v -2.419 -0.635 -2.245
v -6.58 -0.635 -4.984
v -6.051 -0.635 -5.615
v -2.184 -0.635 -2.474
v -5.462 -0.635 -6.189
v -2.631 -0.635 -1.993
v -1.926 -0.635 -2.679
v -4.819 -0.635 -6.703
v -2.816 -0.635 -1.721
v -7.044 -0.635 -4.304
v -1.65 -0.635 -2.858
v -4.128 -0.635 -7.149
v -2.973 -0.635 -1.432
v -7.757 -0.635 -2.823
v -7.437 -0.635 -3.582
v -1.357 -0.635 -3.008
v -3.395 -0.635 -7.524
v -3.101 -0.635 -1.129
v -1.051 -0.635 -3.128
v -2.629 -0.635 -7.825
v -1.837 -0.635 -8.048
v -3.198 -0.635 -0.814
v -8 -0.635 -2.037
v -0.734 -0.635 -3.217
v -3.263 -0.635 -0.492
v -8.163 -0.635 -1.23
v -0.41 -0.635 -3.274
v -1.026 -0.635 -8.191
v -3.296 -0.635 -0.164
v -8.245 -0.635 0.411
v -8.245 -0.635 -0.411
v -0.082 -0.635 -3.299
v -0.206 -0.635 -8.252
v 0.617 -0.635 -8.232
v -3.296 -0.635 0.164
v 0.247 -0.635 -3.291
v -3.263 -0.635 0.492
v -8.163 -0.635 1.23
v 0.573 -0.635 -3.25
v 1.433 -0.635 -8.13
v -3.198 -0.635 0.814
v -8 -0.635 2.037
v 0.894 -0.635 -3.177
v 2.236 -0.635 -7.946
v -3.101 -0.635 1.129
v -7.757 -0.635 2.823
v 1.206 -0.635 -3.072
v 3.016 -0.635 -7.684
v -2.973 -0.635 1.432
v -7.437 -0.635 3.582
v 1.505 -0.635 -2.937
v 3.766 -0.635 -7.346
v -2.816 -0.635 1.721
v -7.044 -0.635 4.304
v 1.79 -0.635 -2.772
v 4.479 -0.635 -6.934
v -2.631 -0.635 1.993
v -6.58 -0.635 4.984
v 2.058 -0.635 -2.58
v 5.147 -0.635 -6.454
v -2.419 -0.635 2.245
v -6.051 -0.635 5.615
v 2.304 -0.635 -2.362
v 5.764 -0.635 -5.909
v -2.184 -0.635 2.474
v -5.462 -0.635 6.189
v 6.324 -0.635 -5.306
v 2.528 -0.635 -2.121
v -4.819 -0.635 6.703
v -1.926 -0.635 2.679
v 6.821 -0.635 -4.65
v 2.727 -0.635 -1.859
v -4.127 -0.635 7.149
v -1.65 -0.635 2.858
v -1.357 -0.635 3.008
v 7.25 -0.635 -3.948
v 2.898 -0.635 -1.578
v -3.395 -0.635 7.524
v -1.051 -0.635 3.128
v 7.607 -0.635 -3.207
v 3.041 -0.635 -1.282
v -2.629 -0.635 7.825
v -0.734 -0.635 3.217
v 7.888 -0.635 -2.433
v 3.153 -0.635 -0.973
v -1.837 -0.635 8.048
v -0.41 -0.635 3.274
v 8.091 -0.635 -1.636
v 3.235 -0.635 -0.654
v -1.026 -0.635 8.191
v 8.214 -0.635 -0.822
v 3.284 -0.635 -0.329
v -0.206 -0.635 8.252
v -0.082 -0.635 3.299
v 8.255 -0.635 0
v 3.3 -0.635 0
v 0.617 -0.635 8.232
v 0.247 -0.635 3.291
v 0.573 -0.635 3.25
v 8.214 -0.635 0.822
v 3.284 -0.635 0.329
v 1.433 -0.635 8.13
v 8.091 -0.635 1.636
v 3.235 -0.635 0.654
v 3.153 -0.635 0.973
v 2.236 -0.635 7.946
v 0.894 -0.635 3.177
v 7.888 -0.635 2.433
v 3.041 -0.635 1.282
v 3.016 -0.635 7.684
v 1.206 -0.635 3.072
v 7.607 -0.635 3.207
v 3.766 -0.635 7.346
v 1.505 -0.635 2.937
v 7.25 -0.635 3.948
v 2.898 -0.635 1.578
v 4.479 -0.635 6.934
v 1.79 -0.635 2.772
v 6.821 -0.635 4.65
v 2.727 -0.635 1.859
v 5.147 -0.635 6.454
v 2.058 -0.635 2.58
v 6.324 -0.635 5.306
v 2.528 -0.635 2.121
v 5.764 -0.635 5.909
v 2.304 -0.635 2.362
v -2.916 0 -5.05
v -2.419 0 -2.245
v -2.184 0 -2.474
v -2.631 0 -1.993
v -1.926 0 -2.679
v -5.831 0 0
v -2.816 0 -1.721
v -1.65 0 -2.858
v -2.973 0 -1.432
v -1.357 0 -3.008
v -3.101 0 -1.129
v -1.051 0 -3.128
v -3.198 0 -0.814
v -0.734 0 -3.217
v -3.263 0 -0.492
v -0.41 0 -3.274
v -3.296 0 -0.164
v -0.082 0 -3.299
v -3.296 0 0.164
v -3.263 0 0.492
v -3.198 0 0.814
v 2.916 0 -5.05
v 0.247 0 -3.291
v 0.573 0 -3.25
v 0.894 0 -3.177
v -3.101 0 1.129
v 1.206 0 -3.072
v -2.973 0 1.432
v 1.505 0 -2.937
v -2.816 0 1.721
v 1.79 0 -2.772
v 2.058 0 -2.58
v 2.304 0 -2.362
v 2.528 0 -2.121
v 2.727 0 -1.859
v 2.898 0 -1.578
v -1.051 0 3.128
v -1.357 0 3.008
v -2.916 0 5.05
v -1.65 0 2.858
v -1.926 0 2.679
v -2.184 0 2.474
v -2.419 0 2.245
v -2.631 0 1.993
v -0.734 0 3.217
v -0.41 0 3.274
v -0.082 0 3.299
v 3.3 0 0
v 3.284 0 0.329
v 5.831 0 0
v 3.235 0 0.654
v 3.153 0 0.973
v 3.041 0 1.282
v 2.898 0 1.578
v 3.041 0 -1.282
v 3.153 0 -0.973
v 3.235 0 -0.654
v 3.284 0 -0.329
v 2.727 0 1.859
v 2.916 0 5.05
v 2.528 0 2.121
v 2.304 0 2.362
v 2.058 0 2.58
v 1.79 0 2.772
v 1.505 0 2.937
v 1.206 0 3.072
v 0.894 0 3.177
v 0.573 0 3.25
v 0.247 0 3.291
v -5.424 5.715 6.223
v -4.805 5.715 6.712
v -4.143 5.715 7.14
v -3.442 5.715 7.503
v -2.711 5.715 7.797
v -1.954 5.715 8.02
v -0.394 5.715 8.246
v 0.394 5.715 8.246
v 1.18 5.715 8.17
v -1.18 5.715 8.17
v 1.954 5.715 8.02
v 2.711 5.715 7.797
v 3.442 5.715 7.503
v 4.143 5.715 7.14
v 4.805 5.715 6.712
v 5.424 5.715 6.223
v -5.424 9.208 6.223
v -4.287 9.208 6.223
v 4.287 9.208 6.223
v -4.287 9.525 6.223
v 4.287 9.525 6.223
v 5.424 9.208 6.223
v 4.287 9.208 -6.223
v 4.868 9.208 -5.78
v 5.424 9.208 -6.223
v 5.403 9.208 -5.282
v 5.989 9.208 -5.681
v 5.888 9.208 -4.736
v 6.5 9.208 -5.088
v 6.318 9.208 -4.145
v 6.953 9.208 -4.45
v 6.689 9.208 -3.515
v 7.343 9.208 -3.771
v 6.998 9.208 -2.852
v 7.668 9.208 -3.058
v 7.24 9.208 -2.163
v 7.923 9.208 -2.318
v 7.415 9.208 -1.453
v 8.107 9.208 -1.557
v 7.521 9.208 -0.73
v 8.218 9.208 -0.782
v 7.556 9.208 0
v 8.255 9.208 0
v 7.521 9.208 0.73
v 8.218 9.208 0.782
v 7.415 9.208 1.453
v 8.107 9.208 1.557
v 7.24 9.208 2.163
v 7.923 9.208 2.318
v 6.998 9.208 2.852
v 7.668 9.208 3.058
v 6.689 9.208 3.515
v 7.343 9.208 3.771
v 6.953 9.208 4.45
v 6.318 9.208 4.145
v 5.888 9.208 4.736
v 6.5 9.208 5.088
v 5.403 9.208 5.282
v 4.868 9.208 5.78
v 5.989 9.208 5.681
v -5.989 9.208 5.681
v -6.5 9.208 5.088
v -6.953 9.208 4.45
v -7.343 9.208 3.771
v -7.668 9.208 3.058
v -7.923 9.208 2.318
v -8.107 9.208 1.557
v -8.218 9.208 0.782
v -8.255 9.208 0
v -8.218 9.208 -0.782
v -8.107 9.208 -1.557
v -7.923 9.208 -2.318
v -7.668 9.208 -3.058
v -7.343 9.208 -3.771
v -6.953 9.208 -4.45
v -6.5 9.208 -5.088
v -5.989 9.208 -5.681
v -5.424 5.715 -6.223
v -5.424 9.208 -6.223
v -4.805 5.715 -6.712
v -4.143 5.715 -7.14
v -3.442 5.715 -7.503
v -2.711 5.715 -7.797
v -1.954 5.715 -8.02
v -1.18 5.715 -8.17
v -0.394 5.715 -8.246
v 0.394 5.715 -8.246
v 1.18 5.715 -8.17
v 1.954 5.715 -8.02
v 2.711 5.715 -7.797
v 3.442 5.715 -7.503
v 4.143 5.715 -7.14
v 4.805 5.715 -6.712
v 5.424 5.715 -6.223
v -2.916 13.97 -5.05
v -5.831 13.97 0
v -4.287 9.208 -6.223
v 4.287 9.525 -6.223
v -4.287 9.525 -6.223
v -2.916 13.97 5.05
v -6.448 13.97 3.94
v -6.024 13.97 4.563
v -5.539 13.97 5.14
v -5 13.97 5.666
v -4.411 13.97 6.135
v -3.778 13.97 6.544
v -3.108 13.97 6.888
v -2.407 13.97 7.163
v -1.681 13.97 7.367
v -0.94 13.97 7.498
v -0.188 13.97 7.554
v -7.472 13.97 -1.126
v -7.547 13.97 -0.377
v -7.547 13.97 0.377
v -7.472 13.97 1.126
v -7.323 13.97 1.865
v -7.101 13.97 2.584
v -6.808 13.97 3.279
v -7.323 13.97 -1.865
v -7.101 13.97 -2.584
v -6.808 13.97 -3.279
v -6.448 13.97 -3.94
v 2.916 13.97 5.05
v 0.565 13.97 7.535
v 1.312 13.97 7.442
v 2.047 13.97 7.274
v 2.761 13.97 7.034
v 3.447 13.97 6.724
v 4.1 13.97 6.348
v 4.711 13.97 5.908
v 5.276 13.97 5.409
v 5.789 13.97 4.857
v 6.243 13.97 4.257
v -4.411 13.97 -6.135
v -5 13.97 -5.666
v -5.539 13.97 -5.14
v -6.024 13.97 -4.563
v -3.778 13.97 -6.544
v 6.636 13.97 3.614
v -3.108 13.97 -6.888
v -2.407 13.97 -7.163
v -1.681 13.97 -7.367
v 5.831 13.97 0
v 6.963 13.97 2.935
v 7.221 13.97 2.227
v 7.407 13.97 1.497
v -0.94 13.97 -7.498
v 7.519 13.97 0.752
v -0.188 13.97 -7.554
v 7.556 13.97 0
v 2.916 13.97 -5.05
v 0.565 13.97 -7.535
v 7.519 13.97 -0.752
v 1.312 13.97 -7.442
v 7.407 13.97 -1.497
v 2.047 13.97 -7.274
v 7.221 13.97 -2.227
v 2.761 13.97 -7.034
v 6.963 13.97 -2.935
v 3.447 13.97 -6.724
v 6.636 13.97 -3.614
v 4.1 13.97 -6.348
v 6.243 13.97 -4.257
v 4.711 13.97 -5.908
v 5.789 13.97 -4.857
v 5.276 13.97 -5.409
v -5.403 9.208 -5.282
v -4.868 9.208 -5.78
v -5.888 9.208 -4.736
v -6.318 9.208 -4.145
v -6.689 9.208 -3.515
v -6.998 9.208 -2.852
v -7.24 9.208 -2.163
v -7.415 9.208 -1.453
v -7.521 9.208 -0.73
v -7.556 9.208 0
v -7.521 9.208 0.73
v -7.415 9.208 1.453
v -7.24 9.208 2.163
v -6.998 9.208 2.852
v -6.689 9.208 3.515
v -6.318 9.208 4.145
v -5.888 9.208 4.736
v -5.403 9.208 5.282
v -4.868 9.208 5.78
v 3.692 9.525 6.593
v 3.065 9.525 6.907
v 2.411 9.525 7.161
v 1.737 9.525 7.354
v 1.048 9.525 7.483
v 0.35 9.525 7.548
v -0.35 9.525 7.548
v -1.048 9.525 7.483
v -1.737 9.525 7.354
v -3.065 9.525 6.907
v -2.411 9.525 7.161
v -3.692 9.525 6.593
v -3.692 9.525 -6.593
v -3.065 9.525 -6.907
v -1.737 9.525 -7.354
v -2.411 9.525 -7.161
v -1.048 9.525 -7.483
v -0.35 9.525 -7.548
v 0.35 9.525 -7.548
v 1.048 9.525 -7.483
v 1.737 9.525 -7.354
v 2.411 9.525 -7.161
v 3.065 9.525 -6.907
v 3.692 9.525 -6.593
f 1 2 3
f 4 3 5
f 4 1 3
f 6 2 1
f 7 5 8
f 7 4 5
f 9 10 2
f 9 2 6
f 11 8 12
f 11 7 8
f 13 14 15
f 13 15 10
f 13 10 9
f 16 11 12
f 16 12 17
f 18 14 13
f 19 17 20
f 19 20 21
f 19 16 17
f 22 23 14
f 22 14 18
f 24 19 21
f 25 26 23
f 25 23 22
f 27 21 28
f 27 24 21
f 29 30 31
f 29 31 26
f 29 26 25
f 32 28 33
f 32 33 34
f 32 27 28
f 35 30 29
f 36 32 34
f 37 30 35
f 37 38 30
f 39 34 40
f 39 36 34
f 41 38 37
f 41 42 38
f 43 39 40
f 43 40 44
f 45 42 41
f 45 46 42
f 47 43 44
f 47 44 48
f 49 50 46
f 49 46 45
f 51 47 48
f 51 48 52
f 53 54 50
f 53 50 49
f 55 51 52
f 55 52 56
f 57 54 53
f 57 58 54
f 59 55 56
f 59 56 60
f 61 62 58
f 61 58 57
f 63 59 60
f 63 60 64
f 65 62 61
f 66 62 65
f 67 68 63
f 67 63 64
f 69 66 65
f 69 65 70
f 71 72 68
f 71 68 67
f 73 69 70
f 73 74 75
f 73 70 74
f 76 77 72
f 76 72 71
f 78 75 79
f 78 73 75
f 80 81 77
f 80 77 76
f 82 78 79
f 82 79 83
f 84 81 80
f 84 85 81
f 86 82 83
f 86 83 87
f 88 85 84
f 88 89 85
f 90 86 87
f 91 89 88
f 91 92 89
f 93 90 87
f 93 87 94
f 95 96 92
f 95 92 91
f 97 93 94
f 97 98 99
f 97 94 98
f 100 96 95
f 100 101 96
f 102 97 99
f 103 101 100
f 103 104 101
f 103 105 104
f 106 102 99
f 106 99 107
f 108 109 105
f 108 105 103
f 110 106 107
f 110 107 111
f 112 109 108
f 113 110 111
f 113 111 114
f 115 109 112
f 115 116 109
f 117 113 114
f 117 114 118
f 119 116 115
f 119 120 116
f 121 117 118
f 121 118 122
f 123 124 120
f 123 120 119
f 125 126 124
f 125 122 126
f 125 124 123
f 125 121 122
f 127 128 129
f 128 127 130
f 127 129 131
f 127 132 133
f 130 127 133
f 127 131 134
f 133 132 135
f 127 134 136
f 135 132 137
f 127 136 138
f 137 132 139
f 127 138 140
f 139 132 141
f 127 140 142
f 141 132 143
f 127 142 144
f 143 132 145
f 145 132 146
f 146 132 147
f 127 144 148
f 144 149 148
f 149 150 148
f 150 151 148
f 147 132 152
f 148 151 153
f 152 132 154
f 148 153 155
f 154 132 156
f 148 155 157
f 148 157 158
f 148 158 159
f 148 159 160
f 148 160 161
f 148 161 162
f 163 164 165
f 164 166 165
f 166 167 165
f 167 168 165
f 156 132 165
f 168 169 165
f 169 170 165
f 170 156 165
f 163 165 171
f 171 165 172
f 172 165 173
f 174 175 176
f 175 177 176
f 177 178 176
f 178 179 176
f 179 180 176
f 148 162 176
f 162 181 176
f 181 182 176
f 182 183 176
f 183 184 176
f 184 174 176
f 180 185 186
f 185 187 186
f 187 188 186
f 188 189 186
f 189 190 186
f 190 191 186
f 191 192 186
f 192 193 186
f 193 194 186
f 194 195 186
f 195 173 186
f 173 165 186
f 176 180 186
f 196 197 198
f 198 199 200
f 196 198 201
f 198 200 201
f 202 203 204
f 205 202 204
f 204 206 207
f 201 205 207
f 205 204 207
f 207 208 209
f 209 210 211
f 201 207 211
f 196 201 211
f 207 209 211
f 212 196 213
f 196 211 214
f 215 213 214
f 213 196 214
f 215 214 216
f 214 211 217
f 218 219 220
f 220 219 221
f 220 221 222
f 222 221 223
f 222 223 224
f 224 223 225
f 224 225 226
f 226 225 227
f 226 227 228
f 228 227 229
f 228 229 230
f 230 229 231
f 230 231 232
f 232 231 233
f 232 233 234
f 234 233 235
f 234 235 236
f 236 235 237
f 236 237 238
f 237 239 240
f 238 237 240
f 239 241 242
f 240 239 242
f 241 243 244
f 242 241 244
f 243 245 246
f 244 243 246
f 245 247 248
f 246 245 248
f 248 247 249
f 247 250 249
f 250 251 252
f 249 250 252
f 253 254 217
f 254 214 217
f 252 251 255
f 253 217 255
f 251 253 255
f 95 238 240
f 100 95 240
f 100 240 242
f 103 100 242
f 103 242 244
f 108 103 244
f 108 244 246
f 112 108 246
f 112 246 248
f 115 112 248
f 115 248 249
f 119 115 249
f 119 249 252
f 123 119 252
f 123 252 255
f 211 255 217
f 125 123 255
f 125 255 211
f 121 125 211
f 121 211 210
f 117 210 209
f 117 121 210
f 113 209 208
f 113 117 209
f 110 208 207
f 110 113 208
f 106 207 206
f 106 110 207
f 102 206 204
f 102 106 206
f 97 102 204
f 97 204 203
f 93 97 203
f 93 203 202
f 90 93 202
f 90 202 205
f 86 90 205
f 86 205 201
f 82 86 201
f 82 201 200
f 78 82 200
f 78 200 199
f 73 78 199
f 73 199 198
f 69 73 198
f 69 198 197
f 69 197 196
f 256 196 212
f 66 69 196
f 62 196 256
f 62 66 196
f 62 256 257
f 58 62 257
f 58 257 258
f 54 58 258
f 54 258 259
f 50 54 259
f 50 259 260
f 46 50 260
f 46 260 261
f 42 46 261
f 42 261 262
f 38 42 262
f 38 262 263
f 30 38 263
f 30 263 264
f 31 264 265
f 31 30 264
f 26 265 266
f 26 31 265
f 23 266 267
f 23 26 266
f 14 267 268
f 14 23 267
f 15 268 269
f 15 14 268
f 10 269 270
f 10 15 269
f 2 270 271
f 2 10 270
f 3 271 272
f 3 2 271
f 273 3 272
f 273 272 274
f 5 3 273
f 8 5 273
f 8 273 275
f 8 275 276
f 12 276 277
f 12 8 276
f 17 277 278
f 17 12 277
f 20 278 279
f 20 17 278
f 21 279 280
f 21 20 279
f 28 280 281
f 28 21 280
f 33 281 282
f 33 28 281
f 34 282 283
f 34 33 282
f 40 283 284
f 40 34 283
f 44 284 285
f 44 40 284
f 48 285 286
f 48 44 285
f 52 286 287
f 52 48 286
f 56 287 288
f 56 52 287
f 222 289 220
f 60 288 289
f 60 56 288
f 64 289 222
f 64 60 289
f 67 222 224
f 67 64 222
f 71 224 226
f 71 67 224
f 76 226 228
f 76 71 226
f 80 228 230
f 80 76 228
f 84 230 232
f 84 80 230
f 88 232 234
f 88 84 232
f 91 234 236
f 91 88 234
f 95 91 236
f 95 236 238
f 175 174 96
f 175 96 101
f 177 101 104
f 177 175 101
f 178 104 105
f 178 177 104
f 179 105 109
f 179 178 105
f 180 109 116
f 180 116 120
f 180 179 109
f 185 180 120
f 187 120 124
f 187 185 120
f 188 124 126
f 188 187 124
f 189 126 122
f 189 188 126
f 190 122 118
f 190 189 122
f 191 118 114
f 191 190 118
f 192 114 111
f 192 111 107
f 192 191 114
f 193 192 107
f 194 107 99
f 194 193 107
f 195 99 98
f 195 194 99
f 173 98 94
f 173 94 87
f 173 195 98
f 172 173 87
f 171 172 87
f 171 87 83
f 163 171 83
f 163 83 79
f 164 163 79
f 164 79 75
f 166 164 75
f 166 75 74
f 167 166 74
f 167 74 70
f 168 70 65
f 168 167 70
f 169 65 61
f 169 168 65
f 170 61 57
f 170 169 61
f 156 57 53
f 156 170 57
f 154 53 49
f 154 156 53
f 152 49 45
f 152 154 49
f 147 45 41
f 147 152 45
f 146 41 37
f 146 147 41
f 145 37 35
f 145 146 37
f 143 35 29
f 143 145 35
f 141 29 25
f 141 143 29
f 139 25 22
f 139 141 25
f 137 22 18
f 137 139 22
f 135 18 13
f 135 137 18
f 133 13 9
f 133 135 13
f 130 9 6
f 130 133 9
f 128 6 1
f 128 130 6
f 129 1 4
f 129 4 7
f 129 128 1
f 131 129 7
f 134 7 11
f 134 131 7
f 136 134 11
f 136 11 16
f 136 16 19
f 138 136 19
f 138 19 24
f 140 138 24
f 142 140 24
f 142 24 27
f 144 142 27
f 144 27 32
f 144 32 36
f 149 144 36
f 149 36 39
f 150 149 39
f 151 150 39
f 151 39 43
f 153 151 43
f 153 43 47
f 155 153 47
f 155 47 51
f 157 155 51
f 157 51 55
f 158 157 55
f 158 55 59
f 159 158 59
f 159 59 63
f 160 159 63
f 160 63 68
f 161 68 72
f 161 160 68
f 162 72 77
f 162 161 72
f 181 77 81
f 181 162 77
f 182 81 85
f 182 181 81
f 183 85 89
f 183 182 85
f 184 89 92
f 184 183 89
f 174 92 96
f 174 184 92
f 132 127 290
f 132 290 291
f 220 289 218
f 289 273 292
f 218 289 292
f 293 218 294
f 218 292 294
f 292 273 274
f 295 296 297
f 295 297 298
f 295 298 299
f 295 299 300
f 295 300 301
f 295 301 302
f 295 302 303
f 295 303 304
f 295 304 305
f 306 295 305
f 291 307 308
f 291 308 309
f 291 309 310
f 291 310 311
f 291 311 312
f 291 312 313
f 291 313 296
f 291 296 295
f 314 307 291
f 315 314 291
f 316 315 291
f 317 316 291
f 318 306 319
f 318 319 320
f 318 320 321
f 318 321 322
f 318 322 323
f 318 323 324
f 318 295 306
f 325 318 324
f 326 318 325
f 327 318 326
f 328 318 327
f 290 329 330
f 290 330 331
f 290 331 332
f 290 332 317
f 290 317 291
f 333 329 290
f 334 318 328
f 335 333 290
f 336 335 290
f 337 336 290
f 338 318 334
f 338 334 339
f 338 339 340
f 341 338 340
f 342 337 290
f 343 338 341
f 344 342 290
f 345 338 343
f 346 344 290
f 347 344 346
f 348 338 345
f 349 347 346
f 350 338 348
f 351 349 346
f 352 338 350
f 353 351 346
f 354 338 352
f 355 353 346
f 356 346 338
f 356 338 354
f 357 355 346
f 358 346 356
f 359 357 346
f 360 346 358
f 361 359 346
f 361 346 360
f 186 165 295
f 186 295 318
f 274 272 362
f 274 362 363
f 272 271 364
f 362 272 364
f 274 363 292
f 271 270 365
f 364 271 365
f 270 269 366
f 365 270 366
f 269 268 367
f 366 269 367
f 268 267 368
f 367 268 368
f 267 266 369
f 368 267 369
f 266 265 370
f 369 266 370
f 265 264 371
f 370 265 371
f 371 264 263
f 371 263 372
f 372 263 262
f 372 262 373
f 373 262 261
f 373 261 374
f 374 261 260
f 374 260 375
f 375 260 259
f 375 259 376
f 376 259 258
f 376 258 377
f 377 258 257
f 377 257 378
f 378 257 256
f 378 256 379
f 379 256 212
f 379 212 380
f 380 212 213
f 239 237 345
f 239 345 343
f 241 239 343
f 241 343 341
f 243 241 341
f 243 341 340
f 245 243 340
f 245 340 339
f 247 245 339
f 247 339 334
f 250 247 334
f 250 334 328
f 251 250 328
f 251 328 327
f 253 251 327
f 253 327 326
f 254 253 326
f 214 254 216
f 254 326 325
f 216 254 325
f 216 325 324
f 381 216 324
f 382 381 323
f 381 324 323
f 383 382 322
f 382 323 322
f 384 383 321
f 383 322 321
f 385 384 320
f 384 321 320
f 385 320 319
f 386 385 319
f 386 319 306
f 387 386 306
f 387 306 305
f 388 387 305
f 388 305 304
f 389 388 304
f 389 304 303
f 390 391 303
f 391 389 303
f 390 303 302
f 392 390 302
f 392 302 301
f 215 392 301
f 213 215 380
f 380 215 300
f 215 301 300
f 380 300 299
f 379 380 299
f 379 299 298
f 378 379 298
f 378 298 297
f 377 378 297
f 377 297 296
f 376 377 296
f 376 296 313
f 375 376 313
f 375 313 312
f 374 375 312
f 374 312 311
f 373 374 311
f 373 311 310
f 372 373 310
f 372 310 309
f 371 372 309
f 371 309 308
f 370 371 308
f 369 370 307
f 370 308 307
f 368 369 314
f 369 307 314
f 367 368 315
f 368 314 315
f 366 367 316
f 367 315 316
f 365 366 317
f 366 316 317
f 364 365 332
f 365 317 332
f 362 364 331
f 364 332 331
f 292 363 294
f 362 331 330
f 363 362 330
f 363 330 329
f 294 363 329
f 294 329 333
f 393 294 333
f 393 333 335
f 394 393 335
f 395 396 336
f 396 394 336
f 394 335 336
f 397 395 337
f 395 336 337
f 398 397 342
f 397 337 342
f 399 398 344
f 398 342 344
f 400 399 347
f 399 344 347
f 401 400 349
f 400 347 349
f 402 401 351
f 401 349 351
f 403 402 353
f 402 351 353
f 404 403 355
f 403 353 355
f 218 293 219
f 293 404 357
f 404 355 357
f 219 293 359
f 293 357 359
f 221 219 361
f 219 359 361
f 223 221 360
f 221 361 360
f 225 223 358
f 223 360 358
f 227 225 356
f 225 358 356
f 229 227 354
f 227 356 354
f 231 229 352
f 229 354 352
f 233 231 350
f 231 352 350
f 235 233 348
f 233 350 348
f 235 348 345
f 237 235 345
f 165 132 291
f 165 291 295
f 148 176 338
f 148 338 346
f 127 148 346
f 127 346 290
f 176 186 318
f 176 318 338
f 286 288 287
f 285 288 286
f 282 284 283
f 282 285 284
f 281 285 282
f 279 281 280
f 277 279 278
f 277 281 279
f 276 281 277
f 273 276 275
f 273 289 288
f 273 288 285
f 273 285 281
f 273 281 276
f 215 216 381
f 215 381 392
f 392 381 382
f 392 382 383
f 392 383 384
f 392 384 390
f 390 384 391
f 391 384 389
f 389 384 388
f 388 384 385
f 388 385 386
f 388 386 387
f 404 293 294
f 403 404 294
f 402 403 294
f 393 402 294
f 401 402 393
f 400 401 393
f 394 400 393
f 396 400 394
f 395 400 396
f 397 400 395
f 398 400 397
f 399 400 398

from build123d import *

# Parameters (mm, degrees)
SKETCH1_R               = 7.5565
BOSS_EXTRUDE1_DEPTH     = 13.97
SKETCH2_R               = 7.5565
SKETCH2_R_2             = 3.3
BOSS_EXTRUDE2_DEPTH     = 0.635
SKETCH4_R               = 8.255
SKETCH4_R_2             = 7.5565
BOSS_EXTRUDE3_DEPTH     = 9.8425
SKETCH3_W               = 2.140633032
SKETCH3_H               = 3.81
SKETCH3_W_2             = 2.256055482
CUT_EXTRUDE1_DEPTH      = 9.255
CUT_EXTRUDE1_DEPTH_BACK = 9.255


with BuildPart() as part:
    # Sketch1 → Boss-Extrude1 (new body)
    with BuildSketch(Plane(origin=(0, 0, 0), x_dir=(1, 0, 0), z_dir=(0, 1, 0))):
        Circle(SKETCH1_R)
        Polygon((-2.915618859, 5.05), (-5.831237719, 0), (-2.915618859, -5.05), (2.915618859, -5.05), (5.831237719, 0), (2.915618859, 5.05), align=None, mode=Mode.SUBTRACT)
    extrude(amount=BOSS_EXTRUDE1_DEPTH)

    # Sketch2 → Boss-Extrude2 (add)
    with BuildSketch(Plane.XZ):
        Circle(SKETCH2_R)
        Circle(SKETCH2_R_2, mode=Mode.SUBTRACT)
    extrude(amount=BOSS_EXTRUDE2_DEPTH)

    # Sketch4 → Boss-Extrude3 (add)
    with BuildSketch(Plane.XZ.offset(0.635)):
        Circle(SKETCH4_R)
        Circle(SKETCH4_R_2, mode=Mode.SUBTRACT)
    extrude(amount=-BOSS_EXTRUDE3_DEPTH)

    # Sketch3 → Cut-Extrude1 (cut, two sides)
    with BuildSketch(Plane(origin=(0, 0, 0), x_dir=(0, 0, -1), z_dir=(1, 0, 0))) as cut_extrude1_sk:
        with Locations((-7.293316516, 7.62)):
            Rectangle(SKETCH3_W, SKETCH3_H)
        with Locations((7.351027741, 7.62)):
            Rectangle(SKETCH3_W_2, SKETCH3_H)
    extrude(amount=CUT_EXTRUDE1_DEPTH, mode=Mode.SUBTRACT)
    extrude(cut_extrude1_sk.sketch, amount=-CUT_EXTRUDE1_DEPTH_BACK, mode=Mode.SUBTRACT)


solid = part.part
